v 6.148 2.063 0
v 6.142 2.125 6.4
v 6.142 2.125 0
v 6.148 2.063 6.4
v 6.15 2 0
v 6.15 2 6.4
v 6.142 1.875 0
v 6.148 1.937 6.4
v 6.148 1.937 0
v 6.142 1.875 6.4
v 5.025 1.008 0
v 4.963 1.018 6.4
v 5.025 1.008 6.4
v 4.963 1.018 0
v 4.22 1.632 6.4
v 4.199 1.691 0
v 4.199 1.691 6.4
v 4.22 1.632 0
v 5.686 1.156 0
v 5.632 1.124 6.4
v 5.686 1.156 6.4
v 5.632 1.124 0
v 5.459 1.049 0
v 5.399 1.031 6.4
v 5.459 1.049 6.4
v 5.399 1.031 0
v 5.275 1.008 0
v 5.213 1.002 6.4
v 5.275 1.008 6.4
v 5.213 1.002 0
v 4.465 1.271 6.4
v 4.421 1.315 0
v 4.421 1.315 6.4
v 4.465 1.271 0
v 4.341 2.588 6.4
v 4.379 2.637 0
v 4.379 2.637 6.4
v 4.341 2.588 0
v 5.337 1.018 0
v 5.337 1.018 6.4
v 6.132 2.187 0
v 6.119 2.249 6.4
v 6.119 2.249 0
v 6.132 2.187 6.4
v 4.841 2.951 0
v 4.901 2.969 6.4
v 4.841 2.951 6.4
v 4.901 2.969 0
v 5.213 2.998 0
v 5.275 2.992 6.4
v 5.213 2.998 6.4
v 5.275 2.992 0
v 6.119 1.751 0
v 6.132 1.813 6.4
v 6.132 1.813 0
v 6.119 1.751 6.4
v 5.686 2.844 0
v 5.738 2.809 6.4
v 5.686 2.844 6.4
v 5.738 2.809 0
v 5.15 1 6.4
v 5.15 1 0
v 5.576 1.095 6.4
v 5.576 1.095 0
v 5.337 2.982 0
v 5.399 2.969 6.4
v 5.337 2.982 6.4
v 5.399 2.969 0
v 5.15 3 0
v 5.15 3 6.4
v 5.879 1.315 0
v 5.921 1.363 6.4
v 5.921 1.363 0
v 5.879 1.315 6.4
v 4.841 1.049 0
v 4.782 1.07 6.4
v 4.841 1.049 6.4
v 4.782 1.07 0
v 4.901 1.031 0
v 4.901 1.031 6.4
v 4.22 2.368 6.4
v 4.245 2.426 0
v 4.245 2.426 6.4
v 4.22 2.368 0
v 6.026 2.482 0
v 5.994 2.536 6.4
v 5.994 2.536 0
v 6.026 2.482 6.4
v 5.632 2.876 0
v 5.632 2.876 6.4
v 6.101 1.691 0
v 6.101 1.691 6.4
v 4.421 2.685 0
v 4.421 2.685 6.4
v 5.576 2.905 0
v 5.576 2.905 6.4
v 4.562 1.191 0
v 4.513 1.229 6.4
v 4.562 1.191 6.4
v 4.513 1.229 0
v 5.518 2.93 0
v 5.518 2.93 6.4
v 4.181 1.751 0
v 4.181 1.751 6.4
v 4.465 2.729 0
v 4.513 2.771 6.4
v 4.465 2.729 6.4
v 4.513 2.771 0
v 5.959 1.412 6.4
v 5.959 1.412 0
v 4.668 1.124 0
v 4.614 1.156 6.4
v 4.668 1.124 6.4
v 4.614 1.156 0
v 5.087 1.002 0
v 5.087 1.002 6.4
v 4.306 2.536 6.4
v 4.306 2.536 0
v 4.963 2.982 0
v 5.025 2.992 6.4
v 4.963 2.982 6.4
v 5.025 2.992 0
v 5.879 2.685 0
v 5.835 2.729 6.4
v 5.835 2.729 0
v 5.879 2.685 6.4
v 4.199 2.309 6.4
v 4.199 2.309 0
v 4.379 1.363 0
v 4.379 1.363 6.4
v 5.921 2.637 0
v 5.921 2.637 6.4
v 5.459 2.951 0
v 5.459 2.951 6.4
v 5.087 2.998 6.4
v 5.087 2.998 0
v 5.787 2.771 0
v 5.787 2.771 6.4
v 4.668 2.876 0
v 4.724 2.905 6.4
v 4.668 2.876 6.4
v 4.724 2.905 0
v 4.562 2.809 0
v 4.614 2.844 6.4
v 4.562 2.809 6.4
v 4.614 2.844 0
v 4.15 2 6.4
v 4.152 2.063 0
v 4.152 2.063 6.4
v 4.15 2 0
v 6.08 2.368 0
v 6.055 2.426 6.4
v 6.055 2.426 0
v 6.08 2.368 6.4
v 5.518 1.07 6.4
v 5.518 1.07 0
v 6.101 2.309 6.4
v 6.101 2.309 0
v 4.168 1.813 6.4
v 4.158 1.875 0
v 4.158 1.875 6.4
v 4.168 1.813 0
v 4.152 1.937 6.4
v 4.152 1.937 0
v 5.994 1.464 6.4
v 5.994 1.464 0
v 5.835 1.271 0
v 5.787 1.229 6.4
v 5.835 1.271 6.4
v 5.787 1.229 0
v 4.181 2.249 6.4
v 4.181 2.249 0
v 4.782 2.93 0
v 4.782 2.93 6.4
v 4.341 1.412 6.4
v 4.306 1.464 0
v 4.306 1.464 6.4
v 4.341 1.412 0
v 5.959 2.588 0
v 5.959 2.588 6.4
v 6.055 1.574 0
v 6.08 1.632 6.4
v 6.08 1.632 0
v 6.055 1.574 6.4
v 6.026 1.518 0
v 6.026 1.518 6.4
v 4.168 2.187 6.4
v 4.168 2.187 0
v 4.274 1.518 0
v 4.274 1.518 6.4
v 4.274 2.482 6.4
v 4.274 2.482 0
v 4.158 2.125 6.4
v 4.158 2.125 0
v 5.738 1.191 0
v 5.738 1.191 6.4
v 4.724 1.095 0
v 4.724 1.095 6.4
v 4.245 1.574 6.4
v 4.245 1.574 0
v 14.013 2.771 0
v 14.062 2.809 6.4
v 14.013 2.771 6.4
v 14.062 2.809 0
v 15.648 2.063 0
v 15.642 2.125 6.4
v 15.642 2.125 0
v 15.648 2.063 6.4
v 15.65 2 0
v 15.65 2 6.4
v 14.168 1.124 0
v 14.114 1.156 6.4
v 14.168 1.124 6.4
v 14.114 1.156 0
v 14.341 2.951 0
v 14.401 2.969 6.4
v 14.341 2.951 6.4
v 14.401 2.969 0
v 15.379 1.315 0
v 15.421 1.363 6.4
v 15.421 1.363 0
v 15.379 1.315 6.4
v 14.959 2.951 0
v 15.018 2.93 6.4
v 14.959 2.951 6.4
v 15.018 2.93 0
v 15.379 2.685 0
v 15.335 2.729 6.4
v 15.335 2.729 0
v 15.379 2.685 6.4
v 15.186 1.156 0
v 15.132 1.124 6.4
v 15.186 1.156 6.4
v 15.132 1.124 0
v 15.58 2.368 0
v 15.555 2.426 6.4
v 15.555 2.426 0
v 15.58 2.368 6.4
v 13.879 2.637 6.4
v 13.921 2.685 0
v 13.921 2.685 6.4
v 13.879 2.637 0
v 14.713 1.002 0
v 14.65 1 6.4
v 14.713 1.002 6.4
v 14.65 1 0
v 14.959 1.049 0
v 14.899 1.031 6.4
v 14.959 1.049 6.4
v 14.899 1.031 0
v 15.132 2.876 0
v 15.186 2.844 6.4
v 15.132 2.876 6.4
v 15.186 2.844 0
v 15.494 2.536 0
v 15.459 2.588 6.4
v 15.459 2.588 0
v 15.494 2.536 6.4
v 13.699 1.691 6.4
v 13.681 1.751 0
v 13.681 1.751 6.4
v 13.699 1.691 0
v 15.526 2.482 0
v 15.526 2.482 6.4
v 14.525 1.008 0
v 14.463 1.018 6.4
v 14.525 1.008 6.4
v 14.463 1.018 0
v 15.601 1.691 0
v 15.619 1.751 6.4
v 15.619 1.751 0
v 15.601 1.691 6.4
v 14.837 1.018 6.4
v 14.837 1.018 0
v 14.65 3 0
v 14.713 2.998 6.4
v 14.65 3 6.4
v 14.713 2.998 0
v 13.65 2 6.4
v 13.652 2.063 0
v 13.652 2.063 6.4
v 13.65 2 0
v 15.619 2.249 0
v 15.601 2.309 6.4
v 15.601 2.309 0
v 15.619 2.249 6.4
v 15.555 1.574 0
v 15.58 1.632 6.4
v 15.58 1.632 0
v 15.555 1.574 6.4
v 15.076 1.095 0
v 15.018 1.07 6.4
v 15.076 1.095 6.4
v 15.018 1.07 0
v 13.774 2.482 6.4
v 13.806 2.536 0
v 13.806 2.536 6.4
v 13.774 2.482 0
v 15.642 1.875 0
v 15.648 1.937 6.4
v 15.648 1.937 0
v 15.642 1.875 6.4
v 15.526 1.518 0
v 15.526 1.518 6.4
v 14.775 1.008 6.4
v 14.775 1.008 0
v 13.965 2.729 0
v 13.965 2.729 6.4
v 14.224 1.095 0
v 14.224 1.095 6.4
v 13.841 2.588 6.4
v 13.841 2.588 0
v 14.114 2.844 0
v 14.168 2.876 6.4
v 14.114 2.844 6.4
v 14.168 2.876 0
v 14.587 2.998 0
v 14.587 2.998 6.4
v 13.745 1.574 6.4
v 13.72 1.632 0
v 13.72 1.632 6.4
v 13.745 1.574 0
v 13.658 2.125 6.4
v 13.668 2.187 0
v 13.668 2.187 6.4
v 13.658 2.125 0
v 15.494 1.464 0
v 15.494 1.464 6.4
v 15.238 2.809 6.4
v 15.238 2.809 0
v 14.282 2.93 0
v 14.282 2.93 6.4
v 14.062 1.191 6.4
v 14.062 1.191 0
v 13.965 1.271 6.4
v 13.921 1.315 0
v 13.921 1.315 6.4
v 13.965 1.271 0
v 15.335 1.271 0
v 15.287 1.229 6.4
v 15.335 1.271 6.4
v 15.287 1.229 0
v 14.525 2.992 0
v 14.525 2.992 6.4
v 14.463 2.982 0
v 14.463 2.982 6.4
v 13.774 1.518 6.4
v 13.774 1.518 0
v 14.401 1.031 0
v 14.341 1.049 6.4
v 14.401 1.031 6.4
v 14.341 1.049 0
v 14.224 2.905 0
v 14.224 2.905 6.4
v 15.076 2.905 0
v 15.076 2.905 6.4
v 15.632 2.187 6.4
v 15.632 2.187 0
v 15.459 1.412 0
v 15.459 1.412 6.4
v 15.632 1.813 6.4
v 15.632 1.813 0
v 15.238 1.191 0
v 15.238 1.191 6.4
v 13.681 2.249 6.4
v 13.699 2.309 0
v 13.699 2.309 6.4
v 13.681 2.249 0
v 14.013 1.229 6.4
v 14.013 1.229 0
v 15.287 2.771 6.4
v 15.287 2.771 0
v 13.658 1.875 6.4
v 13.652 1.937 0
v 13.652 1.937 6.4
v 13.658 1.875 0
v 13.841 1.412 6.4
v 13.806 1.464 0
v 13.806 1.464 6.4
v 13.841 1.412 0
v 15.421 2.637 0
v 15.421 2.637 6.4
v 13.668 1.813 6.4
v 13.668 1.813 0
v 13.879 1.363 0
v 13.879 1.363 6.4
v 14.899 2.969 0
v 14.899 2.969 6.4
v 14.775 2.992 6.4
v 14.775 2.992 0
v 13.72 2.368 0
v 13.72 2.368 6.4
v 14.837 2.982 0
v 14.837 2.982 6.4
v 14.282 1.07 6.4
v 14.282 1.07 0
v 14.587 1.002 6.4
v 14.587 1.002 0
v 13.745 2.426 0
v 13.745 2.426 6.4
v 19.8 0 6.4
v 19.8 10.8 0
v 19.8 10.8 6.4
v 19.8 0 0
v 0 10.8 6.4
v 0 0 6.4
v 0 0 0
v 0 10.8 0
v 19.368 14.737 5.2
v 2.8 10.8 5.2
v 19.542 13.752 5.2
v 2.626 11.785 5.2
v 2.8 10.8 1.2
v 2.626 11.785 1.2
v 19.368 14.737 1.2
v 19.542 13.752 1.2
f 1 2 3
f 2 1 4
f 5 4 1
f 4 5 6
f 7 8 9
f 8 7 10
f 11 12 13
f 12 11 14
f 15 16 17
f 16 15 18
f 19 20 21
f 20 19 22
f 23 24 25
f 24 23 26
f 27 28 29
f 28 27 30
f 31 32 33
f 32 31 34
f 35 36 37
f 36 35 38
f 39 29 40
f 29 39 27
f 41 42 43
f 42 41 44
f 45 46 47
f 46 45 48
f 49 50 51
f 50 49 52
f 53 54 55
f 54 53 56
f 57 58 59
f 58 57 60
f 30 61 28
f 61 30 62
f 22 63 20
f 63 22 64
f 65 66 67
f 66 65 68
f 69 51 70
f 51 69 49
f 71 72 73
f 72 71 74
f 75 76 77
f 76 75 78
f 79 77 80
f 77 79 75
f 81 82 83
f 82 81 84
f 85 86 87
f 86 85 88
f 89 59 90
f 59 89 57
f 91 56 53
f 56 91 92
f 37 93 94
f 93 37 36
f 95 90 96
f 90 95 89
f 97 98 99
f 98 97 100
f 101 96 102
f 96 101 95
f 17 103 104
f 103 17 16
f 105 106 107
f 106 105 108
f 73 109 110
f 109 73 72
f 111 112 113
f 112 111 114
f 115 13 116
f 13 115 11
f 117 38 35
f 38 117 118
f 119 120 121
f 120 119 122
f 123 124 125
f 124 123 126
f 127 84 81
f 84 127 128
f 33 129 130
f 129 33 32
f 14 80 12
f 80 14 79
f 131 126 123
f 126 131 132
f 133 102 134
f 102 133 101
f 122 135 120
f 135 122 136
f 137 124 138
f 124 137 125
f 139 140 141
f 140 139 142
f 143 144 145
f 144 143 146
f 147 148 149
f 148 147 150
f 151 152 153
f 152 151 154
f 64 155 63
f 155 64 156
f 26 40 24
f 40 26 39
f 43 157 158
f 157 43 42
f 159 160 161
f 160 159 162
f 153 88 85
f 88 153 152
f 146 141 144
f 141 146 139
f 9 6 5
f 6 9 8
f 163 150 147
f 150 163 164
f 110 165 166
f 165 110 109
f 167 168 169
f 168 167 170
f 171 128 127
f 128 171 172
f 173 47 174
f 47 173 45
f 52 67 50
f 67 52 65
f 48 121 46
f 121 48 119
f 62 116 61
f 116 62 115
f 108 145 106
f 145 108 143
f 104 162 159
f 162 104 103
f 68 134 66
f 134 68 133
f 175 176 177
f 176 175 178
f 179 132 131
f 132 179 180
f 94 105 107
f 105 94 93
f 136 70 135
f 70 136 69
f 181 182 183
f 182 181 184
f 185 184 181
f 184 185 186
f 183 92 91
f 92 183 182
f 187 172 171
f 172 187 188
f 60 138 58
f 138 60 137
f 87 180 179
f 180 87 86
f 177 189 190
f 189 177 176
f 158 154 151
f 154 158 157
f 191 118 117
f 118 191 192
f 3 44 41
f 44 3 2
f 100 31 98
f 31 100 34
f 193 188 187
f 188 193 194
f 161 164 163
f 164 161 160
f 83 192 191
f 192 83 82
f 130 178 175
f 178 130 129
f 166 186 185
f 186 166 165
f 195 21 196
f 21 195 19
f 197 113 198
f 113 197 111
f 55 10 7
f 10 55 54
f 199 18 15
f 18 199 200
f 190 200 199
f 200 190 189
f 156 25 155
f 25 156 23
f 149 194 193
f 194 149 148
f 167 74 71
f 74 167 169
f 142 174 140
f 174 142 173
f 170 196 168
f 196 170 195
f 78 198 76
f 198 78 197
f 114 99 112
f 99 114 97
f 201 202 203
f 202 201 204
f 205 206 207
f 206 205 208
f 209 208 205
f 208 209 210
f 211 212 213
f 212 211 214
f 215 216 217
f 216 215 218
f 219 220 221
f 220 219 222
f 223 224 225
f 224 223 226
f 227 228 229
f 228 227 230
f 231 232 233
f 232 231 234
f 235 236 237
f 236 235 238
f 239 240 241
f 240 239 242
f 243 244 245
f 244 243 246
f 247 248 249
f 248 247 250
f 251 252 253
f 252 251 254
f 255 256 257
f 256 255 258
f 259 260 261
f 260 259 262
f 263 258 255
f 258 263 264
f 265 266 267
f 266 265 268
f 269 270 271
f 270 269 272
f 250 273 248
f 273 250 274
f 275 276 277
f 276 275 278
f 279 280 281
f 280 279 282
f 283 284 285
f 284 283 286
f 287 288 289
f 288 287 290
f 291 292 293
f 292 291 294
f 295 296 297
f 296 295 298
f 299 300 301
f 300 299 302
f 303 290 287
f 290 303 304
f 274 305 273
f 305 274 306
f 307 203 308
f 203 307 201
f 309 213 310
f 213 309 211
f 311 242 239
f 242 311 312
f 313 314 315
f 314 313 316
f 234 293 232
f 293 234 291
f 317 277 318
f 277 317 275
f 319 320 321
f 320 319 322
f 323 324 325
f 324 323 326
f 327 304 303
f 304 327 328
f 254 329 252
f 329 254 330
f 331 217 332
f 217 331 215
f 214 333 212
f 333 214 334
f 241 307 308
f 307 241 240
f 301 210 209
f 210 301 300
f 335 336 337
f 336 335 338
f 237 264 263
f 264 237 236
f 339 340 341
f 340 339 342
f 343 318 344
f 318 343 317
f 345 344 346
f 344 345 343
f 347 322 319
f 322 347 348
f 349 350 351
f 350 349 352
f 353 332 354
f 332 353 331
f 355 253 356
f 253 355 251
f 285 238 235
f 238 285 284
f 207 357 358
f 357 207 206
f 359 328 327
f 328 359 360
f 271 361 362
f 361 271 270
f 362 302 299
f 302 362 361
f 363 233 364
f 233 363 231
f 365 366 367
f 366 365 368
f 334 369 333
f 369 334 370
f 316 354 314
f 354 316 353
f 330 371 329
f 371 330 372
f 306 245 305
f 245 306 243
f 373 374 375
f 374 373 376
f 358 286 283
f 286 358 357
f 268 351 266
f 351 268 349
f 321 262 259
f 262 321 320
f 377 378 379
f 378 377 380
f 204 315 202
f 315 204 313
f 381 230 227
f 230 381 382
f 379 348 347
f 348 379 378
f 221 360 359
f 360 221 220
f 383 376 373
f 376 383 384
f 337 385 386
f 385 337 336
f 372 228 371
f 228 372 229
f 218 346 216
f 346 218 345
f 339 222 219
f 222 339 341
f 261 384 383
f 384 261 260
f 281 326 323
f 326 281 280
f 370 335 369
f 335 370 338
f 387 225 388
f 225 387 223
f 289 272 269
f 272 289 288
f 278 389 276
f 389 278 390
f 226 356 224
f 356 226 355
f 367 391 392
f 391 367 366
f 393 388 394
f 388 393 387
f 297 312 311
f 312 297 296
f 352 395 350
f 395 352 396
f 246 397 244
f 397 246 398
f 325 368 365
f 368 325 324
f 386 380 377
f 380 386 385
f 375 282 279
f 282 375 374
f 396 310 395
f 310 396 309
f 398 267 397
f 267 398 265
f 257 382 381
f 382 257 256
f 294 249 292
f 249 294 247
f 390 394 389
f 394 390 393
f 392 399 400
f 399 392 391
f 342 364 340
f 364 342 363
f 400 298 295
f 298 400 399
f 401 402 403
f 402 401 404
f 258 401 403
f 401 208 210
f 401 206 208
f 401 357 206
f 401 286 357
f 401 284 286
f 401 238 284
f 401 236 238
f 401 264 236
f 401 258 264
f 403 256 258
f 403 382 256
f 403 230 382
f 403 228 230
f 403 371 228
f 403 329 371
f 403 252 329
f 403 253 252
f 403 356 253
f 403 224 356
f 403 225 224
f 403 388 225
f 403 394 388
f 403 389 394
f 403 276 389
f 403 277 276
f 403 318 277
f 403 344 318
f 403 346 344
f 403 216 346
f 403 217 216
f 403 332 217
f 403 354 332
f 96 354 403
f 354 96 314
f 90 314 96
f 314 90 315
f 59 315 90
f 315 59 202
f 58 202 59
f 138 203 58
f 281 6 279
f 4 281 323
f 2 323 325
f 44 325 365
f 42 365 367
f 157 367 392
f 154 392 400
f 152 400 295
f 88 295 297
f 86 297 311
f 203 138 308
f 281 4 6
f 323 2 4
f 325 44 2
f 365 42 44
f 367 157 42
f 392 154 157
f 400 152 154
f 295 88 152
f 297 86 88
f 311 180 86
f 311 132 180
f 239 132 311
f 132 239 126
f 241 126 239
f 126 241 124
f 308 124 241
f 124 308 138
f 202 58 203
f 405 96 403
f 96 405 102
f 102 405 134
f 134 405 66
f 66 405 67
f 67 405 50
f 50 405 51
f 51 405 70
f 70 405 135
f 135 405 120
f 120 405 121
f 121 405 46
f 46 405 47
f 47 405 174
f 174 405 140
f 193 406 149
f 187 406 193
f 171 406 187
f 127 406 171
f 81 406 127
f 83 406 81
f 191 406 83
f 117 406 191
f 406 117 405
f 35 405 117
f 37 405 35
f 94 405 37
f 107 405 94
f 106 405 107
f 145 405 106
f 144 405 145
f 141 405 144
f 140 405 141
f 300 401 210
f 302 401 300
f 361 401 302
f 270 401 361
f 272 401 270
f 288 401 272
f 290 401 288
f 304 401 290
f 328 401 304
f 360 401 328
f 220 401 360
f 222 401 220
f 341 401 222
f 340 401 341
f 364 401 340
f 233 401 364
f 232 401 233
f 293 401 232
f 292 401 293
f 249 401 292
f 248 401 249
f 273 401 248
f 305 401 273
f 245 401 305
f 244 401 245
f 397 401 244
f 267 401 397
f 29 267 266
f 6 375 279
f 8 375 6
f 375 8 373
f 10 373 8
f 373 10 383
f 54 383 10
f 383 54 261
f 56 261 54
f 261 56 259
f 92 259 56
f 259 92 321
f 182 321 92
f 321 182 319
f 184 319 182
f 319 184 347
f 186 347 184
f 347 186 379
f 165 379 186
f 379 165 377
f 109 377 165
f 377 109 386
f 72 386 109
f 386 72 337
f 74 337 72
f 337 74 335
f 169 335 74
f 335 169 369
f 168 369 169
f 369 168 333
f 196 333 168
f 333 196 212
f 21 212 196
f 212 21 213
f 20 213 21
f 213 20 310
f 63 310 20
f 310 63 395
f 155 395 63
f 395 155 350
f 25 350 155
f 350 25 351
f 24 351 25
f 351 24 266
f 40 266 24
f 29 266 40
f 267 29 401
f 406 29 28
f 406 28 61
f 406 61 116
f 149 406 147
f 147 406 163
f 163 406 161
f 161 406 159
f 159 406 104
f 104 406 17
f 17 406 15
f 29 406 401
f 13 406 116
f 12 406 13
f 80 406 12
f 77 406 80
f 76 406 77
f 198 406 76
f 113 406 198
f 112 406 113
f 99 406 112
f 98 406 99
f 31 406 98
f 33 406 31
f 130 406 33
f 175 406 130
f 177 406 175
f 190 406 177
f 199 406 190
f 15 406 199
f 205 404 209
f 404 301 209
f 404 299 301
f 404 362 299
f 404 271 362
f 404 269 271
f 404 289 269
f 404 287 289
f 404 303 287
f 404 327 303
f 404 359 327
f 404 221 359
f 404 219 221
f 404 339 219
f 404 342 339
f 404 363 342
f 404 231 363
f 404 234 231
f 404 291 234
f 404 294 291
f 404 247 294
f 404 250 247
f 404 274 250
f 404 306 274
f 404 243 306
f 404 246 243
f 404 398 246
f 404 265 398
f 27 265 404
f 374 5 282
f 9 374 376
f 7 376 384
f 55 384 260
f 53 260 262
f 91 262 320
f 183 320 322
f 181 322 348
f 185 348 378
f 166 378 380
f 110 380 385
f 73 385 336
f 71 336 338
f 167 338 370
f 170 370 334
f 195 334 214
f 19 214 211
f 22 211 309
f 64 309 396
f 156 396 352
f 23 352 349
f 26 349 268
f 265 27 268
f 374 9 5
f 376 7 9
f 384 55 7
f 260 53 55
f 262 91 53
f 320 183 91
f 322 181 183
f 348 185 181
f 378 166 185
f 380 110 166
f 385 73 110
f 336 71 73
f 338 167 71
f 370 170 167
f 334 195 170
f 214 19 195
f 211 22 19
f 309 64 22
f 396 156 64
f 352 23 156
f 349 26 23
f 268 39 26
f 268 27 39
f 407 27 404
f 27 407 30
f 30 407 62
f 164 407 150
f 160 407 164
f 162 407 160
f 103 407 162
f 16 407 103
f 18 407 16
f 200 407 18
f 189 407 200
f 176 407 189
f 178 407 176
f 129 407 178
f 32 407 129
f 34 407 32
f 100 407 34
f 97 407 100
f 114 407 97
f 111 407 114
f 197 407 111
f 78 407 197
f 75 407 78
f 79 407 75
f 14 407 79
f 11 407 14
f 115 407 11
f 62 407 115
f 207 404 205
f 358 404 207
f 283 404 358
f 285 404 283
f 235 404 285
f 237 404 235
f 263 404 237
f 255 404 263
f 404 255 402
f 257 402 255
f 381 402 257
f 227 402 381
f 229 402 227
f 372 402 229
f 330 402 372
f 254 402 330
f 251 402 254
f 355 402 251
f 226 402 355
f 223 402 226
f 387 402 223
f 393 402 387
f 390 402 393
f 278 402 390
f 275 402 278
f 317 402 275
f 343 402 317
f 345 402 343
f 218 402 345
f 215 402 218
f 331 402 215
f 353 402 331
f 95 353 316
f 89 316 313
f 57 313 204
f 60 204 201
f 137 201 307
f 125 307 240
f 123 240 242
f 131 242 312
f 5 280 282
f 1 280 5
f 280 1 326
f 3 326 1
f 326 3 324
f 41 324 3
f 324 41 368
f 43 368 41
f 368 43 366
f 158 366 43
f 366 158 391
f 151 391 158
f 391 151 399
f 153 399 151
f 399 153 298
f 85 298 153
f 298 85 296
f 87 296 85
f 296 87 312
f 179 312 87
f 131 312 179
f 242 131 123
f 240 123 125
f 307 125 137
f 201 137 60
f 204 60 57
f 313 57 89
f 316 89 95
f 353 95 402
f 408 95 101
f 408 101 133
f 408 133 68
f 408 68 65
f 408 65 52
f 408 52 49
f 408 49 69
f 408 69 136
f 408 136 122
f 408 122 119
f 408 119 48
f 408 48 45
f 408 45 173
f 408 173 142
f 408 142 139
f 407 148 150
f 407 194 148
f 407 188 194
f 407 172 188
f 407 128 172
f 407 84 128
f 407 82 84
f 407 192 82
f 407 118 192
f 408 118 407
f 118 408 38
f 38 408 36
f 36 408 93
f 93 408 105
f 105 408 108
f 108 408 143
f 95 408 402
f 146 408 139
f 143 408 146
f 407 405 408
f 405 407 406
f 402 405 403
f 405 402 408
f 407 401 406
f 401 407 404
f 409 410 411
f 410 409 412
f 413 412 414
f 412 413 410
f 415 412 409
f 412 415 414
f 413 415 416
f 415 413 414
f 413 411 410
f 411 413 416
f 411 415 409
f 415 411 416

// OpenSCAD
include <MCAD/materials.scad>
include <MCAD/metric_fastners.scad>

module micro_switch(with_extra_parts=false) {
  difference() {
    cube([19.8, 10.8, 6.4]);

    translate([5.15, 2, 0]) {
      translate([0, 0, -0.5])
      cylinder(h = 7.4, R=2.6, $fn=100);
      translate([9.5, 0, -0.5])
      cylinder(h = 7.4, R=2.6, $fn=100);
    }
  }
  translate([2.8, 10.8, 1.2])
  rotate([0,0,10])
  cube([17,1,4]);

  if(with_extra_parts) {
    // --- Self tapping screw 2.2 x 13mm ---
    translate([5.15, 2, 0]) color(Steel) {
      translate([0, 0, 0.5+6.4])
        rotate([180,0,0]) csk_bolt(2.2, 13);
      translate([9.5, 0, 0.5+6.4])
        rotate([180,0,0]) csk_bolt(2.2, 13);
    }
  }
}

micro_switch();
